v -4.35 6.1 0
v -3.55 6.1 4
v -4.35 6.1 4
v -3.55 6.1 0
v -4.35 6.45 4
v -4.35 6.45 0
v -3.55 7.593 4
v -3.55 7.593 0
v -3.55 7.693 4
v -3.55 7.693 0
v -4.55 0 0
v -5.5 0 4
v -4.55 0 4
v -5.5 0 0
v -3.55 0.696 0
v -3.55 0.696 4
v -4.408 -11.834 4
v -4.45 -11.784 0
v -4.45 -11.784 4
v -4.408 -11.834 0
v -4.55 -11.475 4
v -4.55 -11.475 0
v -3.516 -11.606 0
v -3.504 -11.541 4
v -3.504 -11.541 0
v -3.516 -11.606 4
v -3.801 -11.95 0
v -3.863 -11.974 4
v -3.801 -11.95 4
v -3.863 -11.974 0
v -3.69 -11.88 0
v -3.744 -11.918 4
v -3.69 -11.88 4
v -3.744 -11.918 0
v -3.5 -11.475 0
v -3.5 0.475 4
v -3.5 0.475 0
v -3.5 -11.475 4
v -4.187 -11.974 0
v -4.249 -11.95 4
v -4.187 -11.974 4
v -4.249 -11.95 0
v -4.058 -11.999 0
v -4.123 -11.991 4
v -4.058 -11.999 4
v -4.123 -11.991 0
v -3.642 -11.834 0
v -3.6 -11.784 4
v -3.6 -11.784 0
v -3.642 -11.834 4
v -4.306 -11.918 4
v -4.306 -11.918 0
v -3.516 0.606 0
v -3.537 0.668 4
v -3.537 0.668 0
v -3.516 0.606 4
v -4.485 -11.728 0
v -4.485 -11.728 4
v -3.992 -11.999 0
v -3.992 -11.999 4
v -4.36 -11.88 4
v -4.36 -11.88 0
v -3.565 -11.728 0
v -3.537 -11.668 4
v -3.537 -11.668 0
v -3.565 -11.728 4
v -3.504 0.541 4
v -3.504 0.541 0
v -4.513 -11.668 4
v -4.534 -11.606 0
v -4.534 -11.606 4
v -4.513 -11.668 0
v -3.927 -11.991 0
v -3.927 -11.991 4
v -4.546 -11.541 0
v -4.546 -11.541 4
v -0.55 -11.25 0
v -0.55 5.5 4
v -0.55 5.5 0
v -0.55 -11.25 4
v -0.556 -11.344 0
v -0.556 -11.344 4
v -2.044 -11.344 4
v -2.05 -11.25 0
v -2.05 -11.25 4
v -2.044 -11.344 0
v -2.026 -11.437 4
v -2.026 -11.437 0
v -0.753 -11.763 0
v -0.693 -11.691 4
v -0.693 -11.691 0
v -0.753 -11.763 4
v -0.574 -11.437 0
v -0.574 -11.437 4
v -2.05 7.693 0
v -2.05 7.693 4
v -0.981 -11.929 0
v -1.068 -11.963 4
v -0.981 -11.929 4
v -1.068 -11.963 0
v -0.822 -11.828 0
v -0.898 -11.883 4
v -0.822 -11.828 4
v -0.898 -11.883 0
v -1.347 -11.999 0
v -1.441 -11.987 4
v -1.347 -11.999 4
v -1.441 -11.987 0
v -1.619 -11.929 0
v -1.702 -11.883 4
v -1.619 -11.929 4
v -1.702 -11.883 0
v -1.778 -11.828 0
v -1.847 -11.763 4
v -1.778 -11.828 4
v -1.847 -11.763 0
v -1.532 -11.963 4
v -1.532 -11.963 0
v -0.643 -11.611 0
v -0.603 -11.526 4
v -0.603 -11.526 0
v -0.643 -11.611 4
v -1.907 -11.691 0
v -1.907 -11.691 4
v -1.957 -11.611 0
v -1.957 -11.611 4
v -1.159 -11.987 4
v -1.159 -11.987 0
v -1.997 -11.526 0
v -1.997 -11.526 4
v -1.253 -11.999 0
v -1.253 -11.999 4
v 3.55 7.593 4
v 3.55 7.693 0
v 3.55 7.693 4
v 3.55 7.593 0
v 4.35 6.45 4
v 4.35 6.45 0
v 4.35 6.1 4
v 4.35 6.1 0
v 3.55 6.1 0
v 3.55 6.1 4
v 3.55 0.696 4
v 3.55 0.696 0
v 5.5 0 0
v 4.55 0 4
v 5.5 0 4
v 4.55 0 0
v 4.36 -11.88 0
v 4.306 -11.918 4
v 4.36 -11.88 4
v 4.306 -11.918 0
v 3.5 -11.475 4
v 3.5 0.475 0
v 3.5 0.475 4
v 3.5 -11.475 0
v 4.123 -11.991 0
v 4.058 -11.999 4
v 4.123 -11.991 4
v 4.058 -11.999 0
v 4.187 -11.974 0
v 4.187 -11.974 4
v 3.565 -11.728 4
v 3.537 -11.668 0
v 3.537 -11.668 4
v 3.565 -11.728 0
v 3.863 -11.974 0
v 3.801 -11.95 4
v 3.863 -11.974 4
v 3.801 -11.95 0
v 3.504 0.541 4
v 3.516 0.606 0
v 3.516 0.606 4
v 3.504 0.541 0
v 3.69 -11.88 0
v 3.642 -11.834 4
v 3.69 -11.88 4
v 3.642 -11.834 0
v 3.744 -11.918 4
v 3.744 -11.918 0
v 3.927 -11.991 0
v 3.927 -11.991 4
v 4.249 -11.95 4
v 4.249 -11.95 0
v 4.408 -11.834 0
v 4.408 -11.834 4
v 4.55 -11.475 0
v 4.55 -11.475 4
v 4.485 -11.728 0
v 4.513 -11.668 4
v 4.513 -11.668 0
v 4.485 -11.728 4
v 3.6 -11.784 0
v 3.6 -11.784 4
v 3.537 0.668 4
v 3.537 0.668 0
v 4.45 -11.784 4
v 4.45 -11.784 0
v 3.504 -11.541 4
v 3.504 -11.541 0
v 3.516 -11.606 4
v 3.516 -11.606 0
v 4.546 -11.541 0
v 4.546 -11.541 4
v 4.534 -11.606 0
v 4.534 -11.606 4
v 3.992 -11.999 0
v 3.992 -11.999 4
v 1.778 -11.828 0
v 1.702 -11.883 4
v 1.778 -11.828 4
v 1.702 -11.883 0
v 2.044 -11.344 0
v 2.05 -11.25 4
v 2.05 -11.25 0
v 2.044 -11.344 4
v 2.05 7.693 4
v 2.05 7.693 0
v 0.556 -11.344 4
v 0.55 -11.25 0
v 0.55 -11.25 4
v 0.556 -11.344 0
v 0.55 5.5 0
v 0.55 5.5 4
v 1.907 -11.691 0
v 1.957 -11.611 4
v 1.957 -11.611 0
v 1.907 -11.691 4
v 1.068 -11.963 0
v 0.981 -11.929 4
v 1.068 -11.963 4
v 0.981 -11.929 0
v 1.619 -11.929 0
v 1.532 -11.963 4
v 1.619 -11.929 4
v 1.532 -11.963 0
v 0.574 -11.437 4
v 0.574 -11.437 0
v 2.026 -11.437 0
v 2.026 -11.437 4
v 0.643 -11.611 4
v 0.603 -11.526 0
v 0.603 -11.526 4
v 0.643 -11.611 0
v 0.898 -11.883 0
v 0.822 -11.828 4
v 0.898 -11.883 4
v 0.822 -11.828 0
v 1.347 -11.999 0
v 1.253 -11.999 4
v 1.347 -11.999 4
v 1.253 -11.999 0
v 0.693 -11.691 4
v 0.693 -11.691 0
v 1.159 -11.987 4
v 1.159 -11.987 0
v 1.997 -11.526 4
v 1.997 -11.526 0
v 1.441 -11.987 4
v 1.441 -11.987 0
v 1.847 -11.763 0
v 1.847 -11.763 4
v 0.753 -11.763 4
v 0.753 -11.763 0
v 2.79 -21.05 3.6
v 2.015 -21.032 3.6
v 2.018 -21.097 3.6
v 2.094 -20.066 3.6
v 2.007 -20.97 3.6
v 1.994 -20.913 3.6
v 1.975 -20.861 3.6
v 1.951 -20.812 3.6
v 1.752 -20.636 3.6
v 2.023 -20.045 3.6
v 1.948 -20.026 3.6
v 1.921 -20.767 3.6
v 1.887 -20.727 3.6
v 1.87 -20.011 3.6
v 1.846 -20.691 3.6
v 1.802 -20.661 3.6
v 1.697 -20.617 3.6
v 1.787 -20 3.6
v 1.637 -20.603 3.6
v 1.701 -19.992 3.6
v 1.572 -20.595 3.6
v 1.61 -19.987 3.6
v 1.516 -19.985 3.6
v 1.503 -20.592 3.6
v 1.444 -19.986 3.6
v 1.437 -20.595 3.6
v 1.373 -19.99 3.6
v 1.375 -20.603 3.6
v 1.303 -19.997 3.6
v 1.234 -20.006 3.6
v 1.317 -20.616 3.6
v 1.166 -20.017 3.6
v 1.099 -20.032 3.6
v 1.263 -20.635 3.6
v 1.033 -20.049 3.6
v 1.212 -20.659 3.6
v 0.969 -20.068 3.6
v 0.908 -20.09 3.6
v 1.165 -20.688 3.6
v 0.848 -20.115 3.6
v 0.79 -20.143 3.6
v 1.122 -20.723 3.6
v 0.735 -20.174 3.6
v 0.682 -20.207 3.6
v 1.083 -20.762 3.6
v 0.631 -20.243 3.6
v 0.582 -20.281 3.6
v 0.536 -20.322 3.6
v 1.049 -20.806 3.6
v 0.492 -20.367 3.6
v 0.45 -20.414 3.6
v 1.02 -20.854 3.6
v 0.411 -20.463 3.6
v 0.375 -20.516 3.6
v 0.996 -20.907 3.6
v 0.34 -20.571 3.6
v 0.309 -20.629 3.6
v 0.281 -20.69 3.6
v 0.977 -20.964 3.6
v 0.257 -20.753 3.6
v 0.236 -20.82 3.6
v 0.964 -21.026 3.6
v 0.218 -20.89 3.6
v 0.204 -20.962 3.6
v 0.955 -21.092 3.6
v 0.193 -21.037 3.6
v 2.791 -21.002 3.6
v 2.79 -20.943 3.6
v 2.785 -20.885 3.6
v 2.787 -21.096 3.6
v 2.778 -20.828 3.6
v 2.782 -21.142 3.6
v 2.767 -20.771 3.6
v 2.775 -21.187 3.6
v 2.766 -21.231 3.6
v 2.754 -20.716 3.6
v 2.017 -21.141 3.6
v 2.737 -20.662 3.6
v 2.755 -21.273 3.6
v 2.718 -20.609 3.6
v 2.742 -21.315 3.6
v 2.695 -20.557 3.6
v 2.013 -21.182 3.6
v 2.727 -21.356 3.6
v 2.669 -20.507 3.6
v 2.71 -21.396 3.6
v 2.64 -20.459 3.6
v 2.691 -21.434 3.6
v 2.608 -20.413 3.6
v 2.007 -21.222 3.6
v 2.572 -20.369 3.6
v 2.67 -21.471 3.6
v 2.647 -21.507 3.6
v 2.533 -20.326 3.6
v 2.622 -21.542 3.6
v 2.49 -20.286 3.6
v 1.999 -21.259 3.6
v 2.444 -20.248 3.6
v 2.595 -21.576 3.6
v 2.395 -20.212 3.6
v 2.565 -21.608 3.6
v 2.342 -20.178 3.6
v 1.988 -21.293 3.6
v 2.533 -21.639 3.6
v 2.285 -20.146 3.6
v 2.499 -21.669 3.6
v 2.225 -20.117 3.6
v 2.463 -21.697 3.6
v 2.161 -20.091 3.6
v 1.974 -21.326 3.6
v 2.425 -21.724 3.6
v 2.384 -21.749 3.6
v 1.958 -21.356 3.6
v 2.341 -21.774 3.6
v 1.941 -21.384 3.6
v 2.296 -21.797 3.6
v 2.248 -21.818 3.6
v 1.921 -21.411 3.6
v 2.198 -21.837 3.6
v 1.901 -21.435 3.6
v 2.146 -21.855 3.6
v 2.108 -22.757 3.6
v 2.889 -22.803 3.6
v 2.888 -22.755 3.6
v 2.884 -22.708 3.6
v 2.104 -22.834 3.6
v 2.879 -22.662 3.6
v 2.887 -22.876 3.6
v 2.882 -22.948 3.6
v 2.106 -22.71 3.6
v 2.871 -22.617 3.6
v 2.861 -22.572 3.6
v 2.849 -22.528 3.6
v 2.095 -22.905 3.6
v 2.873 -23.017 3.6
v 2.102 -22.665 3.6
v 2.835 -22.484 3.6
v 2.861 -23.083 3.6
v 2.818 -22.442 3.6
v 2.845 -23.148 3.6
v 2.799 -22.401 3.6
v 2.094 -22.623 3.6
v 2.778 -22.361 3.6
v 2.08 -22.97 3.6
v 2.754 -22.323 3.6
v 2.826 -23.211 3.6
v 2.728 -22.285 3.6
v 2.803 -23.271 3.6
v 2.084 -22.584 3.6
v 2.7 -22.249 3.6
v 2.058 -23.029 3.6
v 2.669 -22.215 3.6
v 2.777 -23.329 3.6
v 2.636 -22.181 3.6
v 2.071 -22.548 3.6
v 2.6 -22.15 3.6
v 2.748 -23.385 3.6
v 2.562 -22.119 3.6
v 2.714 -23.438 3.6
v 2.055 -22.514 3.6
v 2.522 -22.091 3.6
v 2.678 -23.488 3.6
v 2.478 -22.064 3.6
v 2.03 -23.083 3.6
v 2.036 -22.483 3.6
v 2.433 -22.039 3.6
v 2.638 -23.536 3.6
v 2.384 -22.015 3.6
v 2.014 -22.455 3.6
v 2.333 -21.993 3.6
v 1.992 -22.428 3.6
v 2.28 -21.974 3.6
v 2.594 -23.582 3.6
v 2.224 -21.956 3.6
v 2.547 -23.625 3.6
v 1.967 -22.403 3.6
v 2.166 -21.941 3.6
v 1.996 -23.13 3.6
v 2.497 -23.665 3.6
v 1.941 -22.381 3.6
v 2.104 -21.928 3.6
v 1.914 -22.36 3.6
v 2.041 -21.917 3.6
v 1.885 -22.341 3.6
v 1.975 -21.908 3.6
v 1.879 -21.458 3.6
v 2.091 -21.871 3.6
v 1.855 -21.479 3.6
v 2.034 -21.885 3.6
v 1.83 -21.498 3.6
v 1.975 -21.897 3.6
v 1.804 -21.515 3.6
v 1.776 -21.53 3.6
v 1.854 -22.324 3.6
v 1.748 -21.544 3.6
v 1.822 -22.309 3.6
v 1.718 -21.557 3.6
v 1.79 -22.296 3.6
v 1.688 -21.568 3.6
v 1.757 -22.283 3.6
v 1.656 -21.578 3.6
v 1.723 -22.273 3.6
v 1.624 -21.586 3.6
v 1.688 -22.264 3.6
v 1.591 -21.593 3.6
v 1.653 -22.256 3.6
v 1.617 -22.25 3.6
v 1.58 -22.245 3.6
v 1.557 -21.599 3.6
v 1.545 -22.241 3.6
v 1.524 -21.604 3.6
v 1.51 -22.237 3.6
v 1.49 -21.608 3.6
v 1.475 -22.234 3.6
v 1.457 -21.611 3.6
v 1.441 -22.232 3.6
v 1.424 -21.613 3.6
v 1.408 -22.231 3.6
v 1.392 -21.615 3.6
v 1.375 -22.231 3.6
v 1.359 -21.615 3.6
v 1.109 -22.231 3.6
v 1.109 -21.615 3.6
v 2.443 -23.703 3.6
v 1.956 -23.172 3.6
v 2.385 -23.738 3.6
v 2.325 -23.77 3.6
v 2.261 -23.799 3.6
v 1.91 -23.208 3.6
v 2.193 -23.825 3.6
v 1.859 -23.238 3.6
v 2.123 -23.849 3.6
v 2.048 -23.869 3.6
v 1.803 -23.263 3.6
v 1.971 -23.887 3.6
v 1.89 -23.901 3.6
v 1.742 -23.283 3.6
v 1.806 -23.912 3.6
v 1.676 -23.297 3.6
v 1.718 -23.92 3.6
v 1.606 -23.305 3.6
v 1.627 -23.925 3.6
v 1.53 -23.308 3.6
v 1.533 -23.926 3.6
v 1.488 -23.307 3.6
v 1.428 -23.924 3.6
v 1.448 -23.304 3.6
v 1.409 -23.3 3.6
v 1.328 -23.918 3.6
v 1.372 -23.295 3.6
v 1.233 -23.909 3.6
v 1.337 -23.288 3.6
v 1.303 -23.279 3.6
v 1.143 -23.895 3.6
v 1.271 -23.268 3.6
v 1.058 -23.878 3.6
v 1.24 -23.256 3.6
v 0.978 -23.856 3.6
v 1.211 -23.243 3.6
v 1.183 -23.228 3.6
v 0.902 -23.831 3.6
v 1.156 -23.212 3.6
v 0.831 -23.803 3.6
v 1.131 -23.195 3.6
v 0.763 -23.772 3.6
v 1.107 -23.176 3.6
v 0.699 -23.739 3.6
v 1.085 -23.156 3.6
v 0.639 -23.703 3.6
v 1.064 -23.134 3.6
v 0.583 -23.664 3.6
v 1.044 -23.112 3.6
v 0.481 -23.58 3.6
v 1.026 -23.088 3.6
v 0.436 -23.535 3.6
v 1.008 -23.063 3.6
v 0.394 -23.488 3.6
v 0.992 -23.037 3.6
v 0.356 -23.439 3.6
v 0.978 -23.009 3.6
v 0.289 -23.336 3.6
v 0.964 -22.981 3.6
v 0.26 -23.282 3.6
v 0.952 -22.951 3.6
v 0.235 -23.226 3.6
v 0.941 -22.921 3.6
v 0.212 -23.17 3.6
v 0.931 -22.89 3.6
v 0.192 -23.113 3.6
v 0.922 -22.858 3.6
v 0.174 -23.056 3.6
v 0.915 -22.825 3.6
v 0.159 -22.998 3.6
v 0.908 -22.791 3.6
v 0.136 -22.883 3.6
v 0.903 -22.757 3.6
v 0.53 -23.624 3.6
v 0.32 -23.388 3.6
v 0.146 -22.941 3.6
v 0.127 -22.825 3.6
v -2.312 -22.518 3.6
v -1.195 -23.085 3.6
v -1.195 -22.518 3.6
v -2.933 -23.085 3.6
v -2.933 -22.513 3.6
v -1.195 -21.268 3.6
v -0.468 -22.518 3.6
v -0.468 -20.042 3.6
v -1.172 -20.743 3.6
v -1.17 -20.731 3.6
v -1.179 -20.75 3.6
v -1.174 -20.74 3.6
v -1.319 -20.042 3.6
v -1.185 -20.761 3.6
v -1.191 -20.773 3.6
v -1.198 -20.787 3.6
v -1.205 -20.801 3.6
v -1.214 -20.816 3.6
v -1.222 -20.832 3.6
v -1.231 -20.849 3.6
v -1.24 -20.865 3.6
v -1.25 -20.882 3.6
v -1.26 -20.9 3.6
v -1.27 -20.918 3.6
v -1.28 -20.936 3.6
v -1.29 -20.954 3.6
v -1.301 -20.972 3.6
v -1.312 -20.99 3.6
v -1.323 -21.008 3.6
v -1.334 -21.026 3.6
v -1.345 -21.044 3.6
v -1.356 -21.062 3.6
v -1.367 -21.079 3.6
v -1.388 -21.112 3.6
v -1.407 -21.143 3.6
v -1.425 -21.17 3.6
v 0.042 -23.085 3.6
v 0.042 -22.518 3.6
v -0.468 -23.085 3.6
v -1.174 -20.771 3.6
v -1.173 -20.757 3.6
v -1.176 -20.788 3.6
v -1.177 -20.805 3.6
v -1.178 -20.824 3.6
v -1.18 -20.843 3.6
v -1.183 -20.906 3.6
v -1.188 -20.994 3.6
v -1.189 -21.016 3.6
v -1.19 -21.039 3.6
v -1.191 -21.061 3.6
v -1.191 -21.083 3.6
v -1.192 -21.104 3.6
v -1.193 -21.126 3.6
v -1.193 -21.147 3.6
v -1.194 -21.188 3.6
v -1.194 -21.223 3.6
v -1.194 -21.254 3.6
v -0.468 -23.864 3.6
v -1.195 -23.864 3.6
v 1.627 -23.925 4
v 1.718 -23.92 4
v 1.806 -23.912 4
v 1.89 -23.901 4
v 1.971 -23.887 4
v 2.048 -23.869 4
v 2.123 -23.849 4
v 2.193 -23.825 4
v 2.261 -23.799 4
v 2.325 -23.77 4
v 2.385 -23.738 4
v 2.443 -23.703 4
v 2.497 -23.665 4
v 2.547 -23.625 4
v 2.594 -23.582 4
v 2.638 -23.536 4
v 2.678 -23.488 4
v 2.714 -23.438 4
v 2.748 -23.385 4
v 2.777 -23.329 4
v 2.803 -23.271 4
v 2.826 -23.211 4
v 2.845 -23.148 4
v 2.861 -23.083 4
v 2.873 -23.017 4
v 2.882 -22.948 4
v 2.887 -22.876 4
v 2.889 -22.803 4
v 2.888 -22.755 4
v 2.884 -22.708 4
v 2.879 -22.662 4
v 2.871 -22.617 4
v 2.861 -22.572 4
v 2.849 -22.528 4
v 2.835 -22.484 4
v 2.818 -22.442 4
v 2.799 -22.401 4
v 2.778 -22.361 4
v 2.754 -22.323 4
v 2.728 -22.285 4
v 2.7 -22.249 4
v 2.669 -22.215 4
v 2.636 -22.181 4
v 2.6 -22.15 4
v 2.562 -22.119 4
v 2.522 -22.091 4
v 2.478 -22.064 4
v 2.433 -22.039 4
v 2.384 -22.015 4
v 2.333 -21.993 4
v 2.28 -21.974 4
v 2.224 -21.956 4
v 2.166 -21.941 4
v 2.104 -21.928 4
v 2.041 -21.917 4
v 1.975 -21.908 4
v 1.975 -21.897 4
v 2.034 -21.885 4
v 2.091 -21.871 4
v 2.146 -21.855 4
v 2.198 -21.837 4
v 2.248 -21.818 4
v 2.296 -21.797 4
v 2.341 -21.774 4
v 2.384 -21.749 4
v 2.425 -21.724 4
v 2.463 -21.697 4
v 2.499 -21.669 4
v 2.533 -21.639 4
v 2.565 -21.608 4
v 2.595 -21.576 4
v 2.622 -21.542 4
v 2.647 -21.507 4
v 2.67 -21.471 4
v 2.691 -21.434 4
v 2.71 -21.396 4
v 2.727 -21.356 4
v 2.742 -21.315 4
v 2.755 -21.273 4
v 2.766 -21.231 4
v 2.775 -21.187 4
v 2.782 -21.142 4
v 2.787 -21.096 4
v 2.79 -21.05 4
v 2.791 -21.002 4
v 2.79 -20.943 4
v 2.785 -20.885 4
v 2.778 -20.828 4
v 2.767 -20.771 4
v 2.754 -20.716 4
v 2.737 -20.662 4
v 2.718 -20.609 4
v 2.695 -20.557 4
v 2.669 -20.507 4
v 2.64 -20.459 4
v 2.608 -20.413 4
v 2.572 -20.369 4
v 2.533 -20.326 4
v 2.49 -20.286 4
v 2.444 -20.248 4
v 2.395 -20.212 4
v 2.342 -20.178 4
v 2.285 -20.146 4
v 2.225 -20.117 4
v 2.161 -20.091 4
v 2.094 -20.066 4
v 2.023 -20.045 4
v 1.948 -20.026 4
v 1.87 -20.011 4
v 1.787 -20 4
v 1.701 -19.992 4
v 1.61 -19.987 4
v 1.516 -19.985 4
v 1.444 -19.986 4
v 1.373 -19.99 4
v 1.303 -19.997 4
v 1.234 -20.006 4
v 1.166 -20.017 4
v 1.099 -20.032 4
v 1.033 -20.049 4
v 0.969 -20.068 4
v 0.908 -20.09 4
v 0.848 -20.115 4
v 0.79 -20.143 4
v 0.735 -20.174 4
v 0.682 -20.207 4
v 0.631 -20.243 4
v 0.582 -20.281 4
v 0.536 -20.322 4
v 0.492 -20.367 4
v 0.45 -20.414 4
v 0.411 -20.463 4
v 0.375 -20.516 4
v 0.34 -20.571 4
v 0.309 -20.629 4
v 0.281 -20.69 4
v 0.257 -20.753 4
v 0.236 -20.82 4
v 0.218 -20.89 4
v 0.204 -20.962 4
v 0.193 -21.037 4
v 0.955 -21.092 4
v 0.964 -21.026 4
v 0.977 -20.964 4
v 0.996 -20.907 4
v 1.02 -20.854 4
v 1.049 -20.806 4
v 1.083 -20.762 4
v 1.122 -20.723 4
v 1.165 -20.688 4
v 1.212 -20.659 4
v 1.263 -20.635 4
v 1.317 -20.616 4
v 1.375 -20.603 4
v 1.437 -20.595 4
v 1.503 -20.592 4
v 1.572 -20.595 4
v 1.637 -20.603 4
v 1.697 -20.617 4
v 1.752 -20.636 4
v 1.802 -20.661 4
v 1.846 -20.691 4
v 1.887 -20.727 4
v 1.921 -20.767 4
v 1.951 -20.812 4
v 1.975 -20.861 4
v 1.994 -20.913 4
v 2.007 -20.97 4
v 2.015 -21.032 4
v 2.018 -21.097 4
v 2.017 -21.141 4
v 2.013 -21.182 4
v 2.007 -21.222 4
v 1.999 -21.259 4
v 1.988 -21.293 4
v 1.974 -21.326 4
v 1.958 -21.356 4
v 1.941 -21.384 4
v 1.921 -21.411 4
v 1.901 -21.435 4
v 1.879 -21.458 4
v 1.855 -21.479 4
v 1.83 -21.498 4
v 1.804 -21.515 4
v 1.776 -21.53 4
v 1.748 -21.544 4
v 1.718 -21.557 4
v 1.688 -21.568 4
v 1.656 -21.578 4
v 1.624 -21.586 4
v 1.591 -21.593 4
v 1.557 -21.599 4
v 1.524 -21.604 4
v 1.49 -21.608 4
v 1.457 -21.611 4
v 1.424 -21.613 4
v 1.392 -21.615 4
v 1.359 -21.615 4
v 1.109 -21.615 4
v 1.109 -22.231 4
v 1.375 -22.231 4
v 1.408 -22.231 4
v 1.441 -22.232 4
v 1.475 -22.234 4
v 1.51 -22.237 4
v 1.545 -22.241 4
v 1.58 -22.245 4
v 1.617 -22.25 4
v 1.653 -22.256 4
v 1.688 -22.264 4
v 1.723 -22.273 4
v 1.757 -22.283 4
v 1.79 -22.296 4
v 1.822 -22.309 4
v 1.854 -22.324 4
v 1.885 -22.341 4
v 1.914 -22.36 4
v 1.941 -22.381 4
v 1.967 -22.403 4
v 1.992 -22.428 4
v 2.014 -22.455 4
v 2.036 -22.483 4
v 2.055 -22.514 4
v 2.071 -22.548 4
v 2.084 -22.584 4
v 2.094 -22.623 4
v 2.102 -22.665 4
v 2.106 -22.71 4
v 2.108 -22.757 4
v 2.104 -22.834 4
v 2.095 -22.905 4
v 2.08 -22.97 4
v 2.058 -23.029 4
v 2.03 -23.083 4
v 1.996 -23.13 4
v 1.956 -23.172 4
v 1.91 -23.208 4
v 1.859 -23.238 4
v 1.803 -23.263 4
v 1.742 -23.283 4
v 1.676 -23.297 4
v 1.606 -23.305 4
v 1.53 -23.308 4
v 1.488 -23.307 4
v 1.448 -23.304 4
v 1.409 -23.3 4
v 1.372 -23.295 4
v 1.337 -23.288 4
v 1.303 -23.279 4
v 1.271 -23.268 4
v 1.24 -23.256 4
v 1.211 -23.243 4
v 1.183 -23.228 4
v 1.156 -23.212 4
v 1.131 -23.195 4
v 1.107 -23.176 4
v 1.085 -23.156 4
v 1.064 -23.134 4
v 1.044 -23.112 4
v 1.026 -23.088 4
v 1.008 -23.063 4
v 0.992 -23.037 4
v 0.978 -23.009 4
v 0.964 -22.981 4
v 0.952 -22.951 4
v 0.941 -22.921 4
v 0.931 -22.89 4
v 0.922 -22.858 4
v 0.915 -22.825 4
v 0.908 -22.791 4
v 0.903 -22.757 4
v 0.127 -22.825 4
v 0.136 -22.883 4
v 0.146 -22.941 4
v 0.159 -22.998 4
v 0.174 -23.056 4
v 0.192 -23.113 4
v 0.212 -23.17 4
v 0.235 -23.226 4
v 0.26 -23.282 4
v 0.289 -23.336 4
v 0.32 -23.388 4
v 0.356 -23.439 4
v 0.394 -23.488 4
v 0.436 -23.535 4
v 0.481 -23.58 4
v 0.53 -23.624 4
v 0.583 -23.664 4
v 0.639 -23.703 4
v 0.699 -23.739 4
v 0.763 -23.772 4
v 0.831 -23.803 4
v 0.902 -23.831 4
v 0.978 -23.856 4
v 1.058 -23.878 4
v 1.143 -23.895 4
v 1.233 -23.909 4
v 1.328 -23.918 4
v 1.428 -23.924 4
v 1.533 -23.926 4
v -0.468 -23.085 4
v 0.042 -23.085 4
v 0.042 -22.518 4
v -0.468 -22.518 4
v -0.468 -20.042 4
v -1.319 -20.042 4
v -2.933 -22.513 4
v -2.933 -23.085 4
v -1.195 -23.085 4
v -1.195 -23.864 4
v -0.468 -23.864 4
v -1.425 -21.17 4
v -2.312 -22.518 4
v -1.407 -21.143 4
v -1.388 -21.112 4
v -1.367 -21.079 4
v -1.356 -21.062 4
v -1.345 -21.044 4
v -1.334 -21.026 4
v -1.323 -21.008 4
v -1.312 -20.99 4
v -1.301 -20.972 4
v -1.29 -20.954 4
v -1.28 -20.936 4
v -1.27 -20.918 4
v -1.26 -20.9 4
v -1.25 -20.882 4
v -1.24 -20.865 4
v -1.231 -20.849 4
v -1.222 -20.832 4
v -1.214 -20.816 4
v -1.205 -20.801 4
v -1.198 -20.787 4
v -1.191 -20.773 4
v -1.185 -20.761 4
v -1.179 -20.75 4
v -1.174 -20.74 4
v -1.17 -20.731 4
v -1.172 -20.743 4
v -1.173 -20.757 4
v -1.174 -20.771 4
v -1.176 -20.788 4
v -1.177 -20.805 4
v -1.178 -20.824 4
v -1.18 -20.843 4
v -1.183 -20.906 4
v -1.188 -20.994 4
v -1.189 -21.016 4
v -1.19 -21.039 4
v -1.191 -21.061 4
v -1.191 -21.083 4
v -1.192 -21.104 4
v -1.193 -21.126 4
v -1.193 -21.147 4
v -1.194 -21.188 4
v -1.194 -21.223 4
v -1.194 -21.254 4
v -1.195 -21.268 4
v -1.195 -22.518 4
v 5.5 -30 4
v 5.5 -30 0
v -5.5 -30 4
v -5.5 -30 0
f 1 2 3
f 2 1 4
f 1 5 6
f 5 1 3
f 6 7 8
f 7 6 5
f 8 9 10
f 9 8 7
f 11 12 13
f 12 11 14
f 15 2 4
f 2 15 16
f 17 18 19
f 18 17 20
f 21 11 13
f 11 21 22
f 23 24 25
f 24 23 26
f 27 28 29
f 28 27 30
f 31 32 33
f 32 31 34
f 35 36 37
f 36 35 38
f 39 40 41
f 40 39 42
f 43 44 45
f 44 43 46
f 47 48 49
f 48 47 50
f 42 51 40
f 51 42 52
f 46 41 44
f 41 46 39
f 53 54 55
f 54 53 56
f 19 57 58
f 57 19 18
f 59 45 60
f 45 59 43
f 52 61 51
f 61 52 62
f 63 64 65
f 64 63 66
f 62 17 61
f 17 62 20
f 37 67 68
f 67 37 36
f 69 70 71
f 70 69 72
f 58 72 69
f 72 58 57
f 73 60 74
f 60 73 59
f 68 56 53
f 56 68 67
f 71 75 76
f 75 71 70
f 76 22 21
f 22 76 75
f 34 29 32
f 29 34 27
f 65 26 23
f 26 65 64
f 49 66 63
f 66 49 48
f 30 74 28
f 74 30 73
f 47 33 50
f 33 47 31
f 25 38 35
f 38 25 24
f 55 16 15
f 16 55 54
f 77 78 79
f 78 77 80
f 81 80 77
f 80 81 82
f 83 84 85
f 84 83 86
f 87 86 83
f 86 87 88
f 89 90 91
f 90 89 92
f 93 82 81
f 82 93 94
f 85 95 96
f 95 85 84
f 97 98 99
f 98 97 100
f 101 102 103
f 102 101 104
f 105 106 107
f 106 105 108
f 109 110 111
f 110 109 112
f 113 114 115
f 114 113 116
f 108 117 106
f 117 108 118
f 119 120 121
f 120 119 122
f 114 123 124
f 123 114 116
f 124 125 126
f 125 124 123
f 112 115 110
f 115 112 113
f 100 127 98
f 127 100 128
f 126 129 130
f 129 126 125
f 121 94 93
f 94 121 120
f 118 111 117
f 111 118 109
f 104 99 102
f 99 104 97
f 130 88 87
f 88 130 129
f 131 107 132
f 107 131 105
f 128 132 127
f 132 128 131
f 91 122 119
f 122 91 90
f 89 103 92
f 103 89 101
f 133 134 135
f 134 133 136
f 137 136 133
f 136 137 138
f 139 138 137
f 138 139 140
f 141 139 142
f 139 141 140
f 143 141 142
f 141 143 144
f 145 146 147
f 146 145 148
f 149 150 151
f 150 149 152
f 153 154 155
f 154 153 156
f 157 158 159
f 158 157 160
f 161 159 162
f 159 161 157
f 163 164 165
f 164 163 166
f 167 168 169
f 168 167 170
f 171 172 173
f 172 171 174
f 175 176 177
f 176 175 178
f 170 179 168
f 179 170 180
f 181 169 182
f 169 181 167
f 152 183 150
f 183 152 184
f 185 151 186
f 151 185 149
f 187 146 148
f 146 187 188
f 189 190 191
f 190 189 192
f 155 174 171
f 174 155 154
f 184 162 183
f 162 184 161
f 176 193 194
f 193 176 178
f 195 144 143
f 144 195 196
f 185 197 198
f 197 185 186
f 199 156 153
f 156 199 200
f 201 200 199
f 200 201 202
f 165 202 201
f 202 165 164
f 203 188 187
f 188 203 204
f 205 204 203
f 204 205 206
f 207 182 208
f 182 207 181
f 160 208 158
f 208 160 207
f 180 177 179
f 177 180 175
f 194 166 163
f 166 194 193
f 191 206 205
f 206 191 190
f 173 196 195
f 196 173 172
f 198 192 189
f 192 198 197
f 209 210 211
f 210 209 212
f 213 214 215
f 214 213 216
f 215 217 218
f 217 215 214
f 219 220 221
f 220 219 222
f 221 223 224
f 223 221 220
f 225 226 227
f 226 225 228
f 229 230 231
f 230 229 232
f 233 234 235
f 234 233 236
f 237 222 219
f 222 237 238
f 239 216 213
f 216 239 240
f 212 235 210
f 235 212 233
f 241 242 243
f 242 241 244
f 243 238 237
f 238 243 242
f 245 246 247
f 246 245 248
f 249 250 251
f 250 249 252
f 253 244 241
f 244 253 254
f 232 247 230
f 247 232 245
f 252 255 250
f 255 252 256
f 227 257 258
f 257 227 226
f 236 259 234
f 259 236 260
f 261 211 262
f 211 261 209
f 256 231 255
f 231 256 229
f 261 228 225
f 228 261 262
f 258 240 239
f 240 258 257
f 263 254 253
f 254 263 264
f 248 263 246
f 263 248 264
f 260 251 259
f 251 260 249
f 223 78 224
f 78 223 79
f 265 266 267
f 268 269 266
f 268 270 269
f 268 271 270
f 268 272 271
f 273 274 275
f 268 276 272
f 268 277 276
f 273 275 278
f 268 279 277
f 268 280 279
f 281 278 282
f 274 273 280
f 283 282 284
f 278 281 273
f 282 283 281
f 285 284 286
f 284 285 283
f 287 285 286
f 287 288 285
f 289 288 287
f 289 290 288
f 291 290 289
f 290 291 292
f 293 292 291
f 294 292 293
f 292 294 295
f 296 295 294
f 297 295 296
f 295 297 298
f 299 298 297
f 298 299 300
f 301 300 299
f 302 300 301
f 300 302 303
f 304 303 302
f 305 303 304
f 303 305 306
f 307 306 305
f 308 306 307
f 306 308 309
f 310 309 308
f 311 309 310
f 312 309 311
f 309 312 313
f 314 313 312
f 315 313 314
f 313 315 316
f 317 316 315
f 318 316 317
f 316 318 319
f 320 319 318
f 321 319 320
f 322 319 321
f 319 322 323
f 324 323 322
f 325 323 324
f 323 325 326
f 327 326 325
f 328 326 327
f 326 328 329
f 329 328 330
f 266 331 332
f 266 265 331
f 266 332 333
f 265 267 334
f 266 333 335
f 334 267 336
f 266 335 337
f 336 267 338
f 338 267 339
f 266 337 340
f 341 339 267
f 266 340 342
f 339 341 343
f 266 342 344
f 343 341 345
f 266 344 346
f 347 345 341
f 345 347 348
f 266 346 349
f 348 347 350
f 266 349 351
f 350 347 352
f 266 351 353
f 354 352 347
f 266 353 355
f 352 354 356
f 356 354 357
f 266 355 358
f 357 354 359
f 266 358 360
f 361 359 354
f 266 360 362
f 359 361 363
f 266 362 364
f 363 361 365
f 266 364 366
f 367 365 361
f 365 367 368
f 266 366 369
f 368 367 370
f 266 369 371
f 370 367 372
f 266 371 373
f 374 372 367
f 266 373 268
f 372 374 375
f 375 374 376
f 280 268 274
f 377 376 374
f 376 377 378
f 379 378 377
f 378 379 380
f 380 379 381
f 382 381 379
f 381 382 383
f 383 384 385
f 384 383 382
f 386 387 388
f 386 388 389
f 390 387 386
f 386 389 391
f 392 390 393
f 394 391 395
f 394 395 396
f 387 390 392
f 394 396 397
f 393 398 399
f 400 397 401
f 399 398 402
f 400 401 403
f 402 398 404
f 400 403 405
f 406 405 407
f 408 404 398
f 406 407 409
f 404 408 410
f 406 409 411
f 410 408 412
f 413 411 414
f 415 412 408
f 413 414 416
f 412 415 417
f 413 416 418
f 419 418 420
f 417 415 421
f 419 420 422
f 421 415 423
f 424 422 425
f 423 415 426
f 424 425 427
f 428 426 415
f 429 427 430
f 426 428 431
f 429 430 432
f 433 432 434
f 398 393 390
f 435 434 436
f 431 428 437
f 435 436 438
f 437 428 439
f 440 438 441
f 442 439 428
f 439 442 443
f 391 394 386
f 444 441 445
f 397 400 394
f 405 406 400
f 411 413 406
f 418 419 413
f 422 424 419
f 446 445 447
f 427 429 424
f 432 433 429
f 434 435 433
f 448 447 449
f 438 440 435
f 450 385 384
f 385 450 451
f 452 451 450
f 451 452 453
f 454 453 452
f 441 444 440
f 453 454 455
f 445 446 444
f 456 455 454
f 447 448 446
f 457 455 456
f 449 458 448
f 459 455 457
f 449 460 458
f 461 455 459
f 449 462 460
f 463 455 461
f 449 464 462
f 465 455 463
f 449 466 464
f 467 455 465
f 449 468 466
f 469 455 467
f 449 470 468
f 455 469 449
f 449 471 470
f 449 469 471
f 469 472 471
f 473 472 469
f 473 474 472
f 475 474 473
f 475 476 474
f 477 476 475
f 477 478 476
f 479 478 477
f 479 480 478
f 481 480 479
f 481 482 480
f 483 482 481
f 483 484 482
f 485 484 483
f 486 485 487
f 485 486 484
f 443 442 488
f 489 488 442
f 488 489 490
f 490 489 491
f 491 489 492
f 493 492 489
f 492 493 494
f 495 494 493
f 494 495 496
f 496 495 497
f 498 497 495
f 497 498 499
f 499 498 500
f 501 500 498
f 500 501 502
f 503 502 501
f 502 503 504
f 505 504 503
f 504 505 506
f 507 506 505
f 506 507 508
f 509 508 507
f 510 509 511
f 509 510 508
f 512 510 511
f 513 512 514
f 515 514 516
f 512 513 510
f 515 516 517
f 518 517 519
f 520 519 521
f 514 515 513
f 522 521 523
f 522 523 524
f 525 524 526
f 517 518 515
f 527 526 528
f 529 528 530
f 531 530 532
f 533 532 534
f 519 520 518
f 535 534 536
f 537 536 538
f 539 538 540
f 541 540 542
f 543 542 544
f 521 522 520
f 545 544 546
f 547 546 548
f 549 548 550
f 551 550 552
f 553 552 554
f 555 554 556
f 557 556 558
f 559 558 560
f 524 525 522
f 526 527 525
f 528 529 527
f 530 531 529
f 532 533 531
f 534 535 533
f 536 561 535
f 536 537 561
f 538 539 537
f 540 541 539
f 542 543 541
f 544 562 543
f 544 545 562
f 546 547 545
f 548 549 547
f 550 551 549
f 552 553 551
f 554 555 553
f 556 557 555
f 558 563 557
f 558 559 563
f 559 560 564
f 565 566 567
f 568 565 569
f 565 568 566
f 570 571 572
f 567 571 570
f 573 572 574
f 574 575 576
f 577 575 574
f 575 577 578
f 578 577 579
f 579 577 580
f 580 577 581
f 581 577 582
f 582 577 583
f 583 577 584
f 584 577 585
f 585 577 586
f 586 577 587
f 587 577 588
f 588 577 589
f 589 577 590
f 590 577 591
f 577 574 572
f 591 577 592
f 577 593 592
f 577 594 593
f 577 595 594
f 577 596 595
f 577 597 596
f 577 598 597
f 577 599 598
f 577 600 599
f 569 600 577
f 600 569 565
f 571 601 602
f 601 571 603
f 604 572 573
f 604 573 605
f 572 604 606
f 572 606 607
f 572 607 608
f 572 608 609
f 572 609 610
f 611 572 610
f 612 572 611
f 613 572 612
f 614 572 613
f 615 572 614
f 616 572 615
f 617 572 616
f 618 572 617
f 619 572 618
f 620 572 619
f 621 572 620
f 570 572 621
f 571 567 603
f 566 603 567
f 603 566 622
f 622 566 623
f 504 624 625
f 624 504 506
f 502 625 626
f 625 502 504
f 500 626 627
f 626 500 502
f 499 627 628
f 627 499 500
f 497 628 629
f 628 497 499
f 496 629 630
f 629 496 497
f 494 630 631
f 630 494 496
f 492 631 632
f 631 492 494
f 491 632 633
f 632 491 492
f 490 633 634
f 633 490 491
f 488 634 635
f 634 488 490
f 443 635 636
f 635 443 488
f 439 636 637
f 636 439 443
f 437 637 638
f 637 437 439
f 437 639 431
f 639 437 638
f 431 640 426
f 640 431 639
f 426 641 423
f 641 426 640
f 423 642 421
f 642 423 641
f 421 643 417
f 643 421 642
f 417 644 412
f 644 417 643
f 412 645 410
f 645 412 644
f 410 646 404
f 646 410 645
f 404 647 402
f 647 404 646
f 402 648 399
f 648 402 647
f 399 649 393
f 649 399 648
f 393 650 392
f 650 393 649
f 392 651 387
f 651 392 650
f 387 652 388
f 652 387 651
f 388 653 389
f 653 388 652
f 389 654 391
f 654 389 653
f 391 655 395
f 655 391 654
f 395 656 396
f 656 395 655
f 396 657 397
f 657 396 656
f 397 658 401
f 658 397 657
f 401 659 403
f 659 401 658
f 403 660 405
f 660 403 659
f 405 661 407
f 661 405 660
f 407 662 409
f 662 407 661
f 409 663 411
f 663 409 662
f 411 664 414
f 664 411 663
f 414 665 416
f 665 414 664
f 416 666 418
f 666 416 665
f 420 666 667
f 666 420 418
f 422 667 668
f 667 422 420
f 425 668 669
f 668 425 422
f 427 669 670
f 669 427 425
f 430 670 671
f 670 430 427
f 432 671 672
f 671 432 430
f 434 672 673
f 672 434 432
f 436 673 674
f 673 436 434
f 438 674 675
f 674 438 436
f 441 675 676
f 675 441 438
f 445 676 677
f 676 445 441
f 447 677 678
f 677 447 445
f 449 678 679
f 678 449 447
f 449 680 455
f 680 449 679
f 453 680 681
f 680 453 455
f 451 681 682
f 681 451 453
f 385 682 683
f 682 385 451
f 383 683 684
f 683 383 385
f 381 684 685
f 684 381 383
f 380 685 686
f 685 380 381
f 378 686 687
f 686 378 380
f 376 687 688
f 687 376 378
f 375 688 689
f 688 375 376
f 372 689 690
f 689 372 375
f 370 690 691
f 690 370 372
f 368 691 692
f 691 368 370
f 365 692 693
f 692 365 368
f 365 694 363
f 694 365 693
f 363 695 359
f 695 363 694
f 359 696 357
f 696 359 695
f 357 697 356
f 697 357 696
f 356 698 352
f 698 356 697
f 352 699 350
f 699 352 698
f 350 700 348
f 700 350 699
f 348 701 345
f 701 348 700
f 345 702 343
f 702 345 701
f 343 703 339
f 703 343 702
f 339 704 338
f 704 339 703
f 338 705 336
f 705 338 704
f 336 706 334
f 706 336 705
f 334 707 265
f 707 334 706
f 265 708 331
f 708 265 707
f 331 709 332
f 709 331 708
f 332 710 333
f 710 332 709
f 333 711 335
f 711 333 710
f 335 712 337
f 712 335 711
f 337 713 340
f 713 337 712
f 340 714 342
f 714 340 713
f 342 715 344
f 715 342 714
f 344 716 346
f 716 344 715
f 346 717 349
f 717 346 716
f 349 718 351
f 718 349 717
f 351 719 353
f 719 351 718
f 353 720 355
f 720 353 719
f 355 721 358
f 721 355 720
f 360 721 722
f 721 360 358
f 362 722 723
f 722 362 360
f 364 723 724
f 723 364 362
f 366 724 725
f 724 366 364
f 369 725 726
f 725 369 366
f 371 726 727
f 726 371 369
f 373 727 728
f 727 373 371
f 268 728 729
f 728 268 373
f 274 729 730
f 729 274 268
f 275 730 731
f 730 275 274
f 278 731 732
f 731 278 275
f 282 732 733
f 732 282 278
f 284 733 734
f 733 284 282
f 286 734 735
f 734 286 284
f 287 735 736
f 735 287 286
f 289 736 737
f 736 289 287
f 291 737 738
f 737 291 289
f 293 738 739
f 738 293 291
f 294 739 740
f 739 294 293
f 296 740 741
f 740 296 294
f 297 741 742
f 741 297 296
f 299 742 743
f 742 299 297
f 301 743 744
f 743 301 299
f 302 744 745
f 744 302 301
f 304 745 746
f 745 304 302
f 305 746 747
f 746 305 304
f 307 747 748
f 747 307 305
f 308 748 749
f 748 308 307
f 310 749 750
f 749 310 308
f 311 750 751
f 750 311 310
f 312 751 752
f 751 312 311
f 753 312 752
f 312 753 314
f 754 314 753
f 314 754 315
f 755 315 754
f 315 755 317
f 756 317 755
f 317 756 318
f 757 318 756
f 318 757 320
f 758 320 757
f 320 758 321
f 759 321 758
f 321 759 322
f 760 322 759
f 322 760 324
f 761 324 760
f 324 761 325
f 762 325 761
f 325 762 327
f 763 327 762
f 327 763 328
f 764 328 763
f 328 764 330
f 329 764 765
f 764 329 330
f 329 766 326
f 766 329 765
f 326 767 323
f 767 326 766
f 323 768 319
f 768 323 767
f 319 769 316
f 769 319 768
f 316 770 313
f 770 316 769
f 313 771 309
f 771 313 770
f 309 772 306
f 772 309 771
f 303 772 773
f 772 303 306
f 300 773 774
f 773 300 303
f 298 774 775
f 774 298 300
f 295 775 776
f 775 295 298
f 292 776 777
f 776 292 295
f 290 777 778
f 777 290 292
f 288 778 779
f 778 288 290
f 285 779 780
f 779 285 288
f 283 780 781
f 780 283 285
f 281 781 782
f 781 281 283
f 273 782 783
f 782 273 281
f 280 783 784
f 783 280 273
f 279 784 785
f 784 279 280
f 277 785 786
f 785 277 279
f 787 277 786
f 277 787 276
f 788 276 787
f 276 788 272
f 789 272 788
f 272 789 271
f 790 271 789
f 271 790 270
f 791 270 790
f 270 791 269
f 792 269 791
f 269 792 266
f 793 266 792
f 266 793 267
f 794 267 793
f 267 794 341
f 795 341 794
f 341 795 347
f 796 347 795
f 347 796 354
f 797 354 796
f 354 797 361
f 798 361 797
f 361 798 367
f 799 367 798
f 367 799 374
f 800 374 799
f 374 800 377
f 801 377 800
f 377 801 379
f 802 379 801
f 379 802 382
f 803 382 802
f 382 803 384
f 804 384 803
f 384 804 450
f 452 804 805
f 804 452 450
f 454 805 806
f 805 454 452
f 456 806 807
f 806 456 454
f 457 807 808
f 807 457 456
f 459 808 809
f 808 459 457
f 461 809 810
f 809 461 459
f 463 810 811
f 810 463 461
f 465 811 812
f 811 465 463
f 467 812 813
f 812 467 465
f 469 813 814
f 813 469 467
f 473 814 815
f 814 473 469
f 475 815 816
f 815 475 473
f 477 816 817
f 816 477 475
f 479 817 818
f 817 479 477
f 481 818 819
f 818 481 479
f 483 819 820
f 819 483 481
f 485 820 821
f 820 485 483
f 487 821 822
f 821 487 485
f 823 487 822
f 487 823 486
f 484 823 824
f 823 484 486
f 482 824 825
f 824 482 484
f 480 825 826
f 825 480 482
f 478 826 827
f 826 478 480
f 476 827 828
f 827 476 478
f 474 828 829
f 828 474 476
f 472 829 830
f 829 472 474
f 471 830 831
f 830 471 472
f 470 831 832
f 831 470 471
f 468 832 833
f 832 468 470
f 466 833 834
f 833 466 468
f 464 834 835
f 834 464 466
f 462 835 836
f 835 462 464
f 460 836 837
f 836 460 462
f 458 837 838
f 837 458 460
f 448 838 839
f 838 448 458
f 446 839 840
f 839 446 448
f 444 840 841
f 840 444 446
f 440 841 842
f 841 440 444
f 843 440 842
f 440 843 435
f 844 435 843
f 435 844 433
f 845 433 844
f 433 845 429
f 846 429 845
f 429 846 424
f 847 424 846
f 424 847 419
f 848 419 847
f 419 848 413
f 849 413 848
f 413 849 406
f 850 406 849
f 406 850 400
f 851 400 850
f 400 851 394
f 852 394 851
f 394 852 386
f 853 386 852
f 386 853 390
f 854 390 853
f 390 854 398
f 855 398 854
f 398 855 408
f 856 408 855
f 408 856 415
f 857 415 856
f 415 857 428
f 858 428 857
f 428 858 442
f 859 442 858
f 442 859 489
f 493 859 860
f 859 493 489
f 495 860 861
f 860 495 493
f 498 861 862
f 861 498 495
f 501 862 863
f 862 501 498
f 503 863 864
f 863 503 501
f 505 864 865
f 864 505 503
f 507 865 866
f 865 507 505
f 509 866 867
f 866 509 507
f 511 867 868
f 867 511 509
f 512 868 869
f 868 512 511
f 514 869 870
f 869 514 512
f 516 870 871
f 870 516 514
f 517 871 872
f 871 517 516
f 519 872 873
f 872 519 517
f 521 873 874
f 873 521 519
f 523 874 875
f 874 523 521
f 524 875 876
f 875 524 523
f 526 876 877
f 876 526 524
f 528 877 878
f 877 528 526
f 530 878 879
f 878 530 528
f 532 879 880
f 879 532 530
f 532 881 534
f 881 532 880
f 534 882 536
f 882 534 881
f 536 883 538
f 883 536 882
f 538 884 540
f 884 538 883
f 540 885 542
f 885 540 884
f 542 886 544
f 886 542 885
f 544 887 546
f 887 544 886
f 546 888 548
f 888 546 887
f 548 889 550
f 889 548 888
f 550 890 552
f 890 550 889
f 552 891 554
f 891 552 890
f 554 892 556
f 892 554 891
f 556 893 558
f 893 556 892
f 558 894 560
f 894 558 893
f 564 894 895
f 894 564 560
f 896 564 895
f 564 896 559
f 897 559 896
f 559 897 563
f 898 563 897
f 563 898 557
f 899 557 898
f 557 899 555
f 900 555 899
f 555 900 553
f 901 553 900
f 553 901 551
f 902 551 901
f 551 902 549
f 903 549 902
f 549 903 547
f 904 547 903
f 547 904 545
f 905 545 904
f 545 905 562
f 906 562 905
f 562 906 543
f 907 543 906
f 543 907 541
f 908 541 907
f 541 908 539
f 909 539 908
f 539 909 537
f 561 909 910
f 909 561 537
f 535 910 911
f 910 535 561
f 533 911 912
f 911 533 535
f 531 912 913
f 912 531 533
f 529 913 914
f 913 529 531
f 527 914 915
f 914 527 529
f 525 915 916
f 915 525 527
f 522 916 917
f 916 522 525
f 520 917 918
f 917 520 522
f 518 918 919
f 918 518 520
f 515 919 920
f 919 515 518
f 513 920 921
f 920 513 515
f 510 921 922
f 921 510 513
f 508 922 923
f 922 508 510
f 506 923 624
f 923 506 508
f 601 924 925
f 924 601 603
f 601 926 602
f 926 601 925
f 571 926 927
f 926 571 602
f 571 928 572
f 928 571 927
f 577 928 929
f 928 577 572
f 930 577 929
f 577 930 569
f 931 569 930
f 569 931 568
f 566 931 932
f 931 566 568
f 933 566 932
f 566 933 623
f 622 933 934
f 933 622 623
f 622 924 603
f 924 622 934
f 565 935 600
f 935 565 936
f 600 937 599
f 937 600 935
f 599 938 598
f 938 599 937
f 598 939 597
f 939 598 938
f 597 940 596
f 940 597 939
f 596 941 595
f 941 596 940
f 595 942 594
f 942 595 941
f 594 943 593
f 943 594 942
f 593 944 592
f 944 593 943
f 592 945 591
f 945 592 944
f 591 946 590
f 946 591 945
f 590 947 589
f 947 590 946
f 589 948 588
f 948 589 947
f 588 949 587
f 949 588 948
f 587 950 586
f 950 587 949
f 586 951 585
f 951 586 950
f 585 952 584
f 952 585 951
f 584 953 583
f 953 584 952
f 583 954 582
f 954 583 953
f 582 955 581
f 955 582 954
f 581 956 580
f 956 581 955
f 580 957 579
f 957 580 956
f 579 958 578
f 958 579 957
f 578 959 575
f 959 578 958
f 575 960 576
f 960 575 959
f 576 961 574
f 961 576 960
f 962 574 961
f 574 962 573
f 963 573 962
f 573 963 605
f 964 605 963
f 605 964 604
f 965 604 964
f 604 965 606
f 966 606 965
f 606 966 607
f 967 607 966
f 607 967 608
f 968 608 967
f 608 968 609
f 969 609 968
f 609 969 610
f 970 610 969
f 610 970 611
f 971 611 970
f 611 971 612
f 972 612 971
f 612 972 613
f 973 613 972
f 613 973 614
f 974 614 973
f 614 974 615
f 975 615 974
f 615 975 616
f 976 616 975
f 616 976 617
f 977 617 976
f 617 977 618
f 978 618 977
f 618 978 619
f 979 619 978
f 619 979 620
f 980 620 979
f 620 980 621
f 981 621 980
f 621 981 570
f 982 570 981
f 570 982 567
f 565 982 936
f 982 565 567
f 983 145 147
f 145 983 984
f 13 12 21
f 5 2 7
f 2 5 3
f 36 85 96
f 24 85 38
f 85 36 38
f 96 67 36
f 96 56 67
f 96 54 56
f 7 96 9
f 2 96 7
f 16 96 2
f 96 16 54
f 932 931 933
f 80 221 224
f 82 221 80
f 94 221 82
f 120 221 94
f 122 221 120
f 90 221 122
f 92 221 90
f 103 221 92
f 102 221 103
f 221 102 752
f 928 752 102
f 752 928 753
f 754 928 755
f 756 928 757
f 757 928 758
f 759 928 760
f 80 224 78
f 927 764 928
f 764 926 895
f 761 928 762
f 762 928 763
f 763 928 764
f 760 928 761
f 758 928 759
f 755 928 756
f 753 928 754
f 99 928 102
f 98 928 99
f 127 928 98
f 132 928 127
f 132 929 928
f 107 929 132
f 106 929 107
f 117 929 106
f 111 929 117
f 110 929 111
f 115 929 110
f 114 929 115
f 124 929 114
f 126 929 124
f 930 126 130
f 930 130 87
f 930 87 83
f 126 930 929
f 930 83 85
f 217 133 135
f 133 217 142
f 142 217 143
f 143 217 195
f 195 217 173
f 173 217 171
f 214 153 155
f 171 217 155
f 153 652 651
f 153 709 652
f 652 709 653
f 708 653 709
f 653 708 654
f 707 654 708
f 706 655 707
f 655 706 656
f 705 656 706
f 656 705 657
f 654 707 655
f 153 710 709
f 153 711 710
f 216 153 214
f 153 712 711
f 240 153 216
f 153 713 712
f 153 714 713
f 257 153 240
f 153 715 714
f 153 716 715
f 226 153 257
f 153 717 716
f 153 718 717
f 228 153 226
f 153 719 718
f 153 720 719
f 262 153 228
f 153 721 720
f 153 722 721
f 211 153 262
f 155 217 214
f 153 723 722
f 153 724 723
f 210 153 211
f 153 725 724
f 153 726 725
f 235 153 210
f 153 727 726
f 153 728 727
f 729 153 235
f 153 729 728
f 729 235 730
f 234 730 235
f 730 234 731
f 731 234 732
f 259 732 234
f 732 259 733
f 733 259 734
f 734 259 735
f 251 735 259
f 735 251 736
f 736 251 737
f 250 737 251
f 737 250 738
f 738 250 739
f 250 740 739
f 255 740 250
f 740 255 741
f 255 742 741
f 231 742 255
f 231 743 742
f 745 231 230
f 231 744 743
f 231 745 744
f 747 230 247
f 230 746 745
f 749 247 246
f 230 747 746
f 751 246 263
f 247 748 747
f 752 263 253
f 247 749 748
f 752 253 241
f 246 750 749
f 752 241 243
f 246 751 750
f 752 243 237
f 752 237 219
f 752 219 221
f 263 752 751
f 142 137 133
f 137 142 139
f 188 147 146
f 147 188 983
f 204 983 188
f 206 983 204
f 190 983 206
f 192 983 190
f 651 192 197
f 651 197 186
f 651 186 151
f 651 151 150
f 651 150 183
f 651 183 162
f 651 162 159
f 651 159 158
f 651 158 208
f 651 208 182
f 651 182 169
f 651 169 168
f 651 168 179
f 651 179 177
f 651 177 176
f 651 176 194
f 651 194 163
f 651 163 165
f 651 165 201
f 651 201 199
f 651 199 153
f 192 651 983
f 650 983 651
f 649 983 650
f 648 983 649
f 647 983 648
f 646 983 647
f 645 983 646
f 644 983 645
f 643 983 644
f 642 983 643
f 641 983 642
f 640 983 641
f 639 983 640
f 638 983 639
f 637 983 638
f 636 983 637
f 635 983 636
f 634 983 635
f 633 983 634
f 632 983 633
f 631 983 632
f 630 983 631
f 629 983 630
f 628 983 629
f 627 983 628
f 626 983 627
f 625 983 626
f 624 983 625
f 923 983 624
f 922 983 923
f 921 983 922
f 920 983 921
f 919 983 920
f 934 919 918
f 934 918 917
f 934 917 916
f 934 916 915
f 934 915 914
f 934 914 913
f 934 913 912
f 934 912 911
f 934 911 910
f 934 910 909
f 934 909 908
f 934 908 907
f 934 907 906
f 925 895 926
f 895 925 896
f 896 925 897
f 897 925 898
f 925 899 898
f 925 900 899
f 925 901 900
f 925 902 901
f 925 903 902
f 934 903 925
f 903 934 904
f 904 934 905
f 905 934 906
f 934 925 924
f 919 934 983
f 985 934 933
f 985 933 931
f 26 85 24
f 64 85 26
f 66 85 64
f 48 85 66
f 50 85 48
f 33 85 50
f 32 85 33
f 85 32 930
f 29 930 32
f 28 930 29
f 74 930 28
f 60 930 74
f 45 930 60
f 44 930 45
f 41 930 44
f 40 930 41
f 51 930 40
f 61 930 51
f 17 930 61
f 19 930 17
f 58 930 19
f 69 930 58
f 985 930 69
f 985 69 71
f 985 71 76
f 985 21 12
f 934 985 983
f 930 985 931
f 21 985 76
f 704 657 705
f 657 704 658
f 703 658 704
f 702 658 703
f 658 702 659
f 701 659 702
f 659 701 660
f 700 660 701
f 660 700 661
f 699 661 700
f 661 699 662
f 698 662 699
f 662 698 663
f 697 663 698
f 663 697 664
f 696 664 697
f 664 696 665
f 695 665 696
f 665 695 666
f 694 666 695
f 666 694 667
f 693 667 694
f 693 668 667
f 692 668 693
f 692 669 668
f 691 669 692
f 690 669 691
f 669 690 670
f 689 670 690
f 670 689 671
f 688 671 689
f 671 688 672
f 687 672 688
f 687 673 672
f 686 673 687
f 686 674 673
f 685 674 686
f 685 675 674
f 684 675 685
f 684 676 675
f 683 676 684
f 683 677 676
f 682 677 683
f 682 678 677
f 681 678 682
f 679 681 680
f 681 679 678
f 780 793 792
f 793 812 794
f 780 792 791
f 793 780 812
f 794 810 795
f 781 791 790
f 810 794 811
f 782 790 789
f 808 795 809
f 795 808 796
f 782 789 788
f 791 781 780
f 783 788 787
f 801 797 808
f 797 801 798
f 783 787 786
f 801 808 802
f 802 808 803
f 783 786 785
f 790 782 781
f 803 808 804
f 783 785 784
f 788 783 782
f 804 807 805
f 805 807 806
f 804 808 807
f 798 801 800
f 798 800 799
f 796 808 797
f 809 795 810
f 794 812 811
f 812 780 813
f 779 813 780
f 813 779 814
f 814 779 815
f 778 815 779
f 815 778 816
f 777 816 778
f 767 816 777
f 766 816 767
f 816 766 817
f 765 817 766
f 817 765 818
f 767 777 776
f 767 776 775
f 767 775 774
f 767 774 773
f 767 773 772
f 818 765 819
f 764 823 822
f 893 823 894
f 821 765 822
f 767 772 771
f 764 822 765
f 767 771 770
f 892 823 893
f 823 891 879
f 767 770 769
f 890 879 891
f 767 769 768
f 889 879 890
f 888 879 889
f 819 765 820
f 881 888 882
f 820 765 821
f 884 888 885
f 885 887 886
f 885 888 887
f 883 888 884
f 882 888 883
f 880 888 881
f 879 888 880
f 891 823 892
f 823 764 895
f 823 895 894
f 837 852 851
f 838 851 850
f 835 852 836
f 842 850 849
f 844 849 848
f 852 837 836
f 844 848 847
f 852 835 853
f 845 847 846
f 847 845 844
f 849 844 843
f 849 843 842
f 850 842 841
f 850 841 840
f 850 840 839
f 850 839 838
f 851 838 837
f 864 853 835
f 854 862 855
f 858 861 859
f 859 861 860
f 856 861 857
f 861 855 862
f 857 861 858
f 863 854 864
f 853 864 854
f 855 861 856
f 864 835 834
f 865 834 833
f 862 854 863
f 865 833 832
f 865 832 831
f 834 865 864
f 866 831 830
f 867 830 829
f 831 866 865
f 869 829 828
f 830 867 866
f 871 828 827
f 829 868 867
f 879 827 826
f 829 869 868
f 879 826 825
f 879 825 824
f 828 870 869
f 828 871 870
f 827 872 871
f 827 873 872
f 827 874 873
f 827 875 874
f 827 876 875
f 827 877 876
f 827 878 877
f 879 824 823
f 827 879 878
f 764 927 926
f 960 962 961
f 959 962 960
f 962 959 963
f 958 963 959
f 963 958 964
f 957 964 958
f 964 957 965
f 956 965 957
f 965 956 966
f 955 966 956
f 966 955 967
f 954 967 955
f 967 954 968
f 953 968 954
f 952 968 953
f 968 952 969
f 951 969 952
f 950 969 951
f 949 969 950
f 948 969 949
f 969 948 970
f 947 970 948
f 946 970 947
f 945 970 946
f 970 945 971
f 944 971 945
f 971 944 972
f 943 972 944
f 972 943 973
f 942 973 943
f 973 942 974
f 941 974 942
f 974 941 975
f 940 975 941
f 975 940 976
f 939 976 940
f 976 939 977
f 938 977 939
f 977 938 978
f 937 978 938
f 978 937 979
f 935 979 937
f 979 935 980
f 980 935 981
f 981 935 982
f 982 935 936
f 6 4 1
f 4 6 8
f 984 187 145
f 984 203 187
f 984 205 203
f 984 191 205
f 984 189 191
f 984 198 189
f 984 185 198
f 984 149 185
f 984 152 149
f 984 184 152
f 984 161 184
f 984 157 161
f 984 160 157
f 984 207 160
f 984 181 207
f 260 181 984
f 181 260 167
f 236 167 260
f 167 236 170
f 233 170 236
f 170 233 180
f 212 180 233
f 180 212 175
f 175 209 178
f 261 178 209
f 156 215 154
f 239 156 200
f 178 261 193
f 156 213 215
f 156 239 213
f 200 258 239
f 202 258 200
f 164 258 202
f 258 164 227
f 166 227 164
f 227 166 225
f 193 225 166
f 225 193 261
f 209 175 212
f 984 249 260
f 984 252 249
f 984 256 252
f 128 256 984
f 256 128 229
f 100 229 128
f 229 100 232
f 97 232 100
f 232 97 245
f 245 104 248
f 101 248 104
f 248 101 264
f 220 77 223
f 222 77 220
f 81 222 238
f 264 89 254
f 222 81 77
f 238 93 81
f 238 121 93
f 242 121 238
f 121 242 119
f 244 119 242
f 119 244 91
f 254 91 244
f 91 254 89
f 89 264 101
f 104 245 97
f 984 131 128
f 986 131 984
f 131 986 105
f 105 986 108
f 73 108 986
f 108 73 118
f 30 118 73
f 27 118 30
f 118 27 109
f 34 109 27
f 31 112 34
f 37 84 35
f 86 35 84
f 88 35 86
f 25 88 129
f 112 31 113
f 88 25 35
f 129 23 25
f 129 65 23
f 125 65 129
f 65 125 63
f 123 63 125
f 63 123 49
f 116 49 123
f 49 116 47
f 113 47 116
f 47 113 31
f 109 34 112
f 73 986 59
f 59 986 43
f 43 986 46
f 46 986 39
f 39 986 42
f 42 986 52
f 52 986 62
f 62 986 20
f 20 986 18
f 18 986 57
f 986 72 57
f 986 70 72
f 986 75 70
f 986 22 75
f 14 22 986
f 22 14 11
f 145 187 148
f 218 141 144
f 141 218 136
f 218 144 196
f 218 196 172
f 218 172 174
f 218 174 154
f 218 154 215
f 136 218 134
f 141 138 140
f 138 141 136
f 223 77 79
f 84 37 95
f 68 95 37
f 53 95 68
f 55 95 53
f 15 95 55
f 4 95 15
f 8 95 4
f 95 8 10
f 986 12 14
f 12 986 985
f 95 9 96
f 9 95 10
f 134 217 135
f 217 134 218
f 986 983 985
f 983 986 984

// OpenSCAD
$fn = 50;

difference() {
	union() {
		translate(v = [0, 0, 0]) {
			rotate(a = [0, 0, 0]) {
				difference() {
					union() {
						translate(v = [-5.5, -30.0, 0]) {
							cube(size = [11.0, 37.69251840539369, 4.0]);
						}
					}
					union() {
						translate(v = [0, 0, -0.1]) {
							linear_extrude(height = 4.2) {
								polygon(points = [[-3.55, 0], [-3.55, 6.1], [-4.35, 6.1], [-4.35, 6.449999999999999], [-3.55, 7.592518405393691], [-3.55, 8.692518405393692], [-5.7, 8.692518405393692], [-5.7, 0]]);
							}
						}
						translate(v = [-4.0249999999999995, -5.5, -0.1]) {
							hull() {
								translate(v = [-0.0, 5.975, 0]) {
									cylinder(h = 4.2, r = 0.525);
								}
								translate(v = [0.0, 5.975, 0]) {
									cylinder(h = 4.2, r = 0.525);
								}
								translate(v = [-0.0, -5.975, 0]) {
									cylinder(h = 4.2, r = 0.525);
								}
								translate(v = [0.0, -5.975, 0]) {
									cylinder(h = 4.2, r = 0.525);
								}
							}
						}
						translate(v = [-1.2999999999999998, -1.6537407973031542, -0.1]) {
							hull() {
								translate(v = [-0.0, 9.596259202696846, 0]) {
									cylinder(h = 4.2, r = 0.7499999999999999);
								}
								translate(v = [0.0, 9.596259202696846, 0]) {
									cylinder(h = 4.2, r = 0.7499999999999999);
								}
								translate(v = [-0.0, -9.596259202696846, 0]) {
									cylinder(h = 4.2, r = 0.7499999999999999);
								}
								translate(v = [0.0, -9.596259202696846, 0]) {
									cylinder(h = 4.2, r = 0.7499999999999999);
								}
							}
						}
						translate(v = [0, 0, -0.1]) {
							linear_extrude(height = 4.2) {
								polygon(points = [[3.55, 0], [3.55, 6.1], [4.35, 6.1], [4.35, 6.449999999999999], [3.55, 7.592518405393691], [3.55, 8.692518405393692], [5.7, 8.692518405393692], [5.7, 0]]);
							}
						}
						translate(v = [4.0249999999999995, -5.5, -0.1]) {
							hull() {
								translate(v = [-0.0, 5.975, 0]) {
									cylinder(h = 4.2, r = 0.525);
								}
								translate(v = [0.0, 5.975, 0]) {
									cylinder(h = 4.2, r = 0.525);
								}
								translate(v = [-0.0, -5.975, 0]) {
									cylinder(h = 4.2, r = 0.525);
								}
								translate(v = [0.0, -5.975, 0]) {
									cylinder(h = 4.2, r = 0.525);
								}
							}
						}
						translate(v = [1.2999999999999998, -1.6537407973031542, -0.1]) {
							hull() {
								translate(v = [-0.0, 9.596259202696846, 0]) {
									cylinder(h = 4.2, r = 0.7499999999999999);
								}
								translate(v = [0.0, 9.596259202696846, 0]) {
									cylinder(h = 4.2, r = 0.7499999999999999);
								}
								translate(v = [-0.0, -9.596259202696846, 0]) {
									cylinder(h = 4.2, r = 0.7499999999999999);
								}
								translate(v = [0.0, -9.596259202696846, 0]) {
									cylinder(h = 4.2, r = 0.7499999999999999);
								}
							}
						}
						translate(v = [-0.6000000000000001, 5.5, -0.1]) {
							cube(size = [1.2000000000000002, 3.192518405393691, 4.2]);
						}
						translate(v = [0, -22, 3.6]) {
							linear_extrude(height = 0.5) {
								text(font = "Arial:style=Bold", halign = "center", size = 4.0, text = "43", valign = "center");
							}
						}
					}
				}
			}
		}
	}
	union();
}
